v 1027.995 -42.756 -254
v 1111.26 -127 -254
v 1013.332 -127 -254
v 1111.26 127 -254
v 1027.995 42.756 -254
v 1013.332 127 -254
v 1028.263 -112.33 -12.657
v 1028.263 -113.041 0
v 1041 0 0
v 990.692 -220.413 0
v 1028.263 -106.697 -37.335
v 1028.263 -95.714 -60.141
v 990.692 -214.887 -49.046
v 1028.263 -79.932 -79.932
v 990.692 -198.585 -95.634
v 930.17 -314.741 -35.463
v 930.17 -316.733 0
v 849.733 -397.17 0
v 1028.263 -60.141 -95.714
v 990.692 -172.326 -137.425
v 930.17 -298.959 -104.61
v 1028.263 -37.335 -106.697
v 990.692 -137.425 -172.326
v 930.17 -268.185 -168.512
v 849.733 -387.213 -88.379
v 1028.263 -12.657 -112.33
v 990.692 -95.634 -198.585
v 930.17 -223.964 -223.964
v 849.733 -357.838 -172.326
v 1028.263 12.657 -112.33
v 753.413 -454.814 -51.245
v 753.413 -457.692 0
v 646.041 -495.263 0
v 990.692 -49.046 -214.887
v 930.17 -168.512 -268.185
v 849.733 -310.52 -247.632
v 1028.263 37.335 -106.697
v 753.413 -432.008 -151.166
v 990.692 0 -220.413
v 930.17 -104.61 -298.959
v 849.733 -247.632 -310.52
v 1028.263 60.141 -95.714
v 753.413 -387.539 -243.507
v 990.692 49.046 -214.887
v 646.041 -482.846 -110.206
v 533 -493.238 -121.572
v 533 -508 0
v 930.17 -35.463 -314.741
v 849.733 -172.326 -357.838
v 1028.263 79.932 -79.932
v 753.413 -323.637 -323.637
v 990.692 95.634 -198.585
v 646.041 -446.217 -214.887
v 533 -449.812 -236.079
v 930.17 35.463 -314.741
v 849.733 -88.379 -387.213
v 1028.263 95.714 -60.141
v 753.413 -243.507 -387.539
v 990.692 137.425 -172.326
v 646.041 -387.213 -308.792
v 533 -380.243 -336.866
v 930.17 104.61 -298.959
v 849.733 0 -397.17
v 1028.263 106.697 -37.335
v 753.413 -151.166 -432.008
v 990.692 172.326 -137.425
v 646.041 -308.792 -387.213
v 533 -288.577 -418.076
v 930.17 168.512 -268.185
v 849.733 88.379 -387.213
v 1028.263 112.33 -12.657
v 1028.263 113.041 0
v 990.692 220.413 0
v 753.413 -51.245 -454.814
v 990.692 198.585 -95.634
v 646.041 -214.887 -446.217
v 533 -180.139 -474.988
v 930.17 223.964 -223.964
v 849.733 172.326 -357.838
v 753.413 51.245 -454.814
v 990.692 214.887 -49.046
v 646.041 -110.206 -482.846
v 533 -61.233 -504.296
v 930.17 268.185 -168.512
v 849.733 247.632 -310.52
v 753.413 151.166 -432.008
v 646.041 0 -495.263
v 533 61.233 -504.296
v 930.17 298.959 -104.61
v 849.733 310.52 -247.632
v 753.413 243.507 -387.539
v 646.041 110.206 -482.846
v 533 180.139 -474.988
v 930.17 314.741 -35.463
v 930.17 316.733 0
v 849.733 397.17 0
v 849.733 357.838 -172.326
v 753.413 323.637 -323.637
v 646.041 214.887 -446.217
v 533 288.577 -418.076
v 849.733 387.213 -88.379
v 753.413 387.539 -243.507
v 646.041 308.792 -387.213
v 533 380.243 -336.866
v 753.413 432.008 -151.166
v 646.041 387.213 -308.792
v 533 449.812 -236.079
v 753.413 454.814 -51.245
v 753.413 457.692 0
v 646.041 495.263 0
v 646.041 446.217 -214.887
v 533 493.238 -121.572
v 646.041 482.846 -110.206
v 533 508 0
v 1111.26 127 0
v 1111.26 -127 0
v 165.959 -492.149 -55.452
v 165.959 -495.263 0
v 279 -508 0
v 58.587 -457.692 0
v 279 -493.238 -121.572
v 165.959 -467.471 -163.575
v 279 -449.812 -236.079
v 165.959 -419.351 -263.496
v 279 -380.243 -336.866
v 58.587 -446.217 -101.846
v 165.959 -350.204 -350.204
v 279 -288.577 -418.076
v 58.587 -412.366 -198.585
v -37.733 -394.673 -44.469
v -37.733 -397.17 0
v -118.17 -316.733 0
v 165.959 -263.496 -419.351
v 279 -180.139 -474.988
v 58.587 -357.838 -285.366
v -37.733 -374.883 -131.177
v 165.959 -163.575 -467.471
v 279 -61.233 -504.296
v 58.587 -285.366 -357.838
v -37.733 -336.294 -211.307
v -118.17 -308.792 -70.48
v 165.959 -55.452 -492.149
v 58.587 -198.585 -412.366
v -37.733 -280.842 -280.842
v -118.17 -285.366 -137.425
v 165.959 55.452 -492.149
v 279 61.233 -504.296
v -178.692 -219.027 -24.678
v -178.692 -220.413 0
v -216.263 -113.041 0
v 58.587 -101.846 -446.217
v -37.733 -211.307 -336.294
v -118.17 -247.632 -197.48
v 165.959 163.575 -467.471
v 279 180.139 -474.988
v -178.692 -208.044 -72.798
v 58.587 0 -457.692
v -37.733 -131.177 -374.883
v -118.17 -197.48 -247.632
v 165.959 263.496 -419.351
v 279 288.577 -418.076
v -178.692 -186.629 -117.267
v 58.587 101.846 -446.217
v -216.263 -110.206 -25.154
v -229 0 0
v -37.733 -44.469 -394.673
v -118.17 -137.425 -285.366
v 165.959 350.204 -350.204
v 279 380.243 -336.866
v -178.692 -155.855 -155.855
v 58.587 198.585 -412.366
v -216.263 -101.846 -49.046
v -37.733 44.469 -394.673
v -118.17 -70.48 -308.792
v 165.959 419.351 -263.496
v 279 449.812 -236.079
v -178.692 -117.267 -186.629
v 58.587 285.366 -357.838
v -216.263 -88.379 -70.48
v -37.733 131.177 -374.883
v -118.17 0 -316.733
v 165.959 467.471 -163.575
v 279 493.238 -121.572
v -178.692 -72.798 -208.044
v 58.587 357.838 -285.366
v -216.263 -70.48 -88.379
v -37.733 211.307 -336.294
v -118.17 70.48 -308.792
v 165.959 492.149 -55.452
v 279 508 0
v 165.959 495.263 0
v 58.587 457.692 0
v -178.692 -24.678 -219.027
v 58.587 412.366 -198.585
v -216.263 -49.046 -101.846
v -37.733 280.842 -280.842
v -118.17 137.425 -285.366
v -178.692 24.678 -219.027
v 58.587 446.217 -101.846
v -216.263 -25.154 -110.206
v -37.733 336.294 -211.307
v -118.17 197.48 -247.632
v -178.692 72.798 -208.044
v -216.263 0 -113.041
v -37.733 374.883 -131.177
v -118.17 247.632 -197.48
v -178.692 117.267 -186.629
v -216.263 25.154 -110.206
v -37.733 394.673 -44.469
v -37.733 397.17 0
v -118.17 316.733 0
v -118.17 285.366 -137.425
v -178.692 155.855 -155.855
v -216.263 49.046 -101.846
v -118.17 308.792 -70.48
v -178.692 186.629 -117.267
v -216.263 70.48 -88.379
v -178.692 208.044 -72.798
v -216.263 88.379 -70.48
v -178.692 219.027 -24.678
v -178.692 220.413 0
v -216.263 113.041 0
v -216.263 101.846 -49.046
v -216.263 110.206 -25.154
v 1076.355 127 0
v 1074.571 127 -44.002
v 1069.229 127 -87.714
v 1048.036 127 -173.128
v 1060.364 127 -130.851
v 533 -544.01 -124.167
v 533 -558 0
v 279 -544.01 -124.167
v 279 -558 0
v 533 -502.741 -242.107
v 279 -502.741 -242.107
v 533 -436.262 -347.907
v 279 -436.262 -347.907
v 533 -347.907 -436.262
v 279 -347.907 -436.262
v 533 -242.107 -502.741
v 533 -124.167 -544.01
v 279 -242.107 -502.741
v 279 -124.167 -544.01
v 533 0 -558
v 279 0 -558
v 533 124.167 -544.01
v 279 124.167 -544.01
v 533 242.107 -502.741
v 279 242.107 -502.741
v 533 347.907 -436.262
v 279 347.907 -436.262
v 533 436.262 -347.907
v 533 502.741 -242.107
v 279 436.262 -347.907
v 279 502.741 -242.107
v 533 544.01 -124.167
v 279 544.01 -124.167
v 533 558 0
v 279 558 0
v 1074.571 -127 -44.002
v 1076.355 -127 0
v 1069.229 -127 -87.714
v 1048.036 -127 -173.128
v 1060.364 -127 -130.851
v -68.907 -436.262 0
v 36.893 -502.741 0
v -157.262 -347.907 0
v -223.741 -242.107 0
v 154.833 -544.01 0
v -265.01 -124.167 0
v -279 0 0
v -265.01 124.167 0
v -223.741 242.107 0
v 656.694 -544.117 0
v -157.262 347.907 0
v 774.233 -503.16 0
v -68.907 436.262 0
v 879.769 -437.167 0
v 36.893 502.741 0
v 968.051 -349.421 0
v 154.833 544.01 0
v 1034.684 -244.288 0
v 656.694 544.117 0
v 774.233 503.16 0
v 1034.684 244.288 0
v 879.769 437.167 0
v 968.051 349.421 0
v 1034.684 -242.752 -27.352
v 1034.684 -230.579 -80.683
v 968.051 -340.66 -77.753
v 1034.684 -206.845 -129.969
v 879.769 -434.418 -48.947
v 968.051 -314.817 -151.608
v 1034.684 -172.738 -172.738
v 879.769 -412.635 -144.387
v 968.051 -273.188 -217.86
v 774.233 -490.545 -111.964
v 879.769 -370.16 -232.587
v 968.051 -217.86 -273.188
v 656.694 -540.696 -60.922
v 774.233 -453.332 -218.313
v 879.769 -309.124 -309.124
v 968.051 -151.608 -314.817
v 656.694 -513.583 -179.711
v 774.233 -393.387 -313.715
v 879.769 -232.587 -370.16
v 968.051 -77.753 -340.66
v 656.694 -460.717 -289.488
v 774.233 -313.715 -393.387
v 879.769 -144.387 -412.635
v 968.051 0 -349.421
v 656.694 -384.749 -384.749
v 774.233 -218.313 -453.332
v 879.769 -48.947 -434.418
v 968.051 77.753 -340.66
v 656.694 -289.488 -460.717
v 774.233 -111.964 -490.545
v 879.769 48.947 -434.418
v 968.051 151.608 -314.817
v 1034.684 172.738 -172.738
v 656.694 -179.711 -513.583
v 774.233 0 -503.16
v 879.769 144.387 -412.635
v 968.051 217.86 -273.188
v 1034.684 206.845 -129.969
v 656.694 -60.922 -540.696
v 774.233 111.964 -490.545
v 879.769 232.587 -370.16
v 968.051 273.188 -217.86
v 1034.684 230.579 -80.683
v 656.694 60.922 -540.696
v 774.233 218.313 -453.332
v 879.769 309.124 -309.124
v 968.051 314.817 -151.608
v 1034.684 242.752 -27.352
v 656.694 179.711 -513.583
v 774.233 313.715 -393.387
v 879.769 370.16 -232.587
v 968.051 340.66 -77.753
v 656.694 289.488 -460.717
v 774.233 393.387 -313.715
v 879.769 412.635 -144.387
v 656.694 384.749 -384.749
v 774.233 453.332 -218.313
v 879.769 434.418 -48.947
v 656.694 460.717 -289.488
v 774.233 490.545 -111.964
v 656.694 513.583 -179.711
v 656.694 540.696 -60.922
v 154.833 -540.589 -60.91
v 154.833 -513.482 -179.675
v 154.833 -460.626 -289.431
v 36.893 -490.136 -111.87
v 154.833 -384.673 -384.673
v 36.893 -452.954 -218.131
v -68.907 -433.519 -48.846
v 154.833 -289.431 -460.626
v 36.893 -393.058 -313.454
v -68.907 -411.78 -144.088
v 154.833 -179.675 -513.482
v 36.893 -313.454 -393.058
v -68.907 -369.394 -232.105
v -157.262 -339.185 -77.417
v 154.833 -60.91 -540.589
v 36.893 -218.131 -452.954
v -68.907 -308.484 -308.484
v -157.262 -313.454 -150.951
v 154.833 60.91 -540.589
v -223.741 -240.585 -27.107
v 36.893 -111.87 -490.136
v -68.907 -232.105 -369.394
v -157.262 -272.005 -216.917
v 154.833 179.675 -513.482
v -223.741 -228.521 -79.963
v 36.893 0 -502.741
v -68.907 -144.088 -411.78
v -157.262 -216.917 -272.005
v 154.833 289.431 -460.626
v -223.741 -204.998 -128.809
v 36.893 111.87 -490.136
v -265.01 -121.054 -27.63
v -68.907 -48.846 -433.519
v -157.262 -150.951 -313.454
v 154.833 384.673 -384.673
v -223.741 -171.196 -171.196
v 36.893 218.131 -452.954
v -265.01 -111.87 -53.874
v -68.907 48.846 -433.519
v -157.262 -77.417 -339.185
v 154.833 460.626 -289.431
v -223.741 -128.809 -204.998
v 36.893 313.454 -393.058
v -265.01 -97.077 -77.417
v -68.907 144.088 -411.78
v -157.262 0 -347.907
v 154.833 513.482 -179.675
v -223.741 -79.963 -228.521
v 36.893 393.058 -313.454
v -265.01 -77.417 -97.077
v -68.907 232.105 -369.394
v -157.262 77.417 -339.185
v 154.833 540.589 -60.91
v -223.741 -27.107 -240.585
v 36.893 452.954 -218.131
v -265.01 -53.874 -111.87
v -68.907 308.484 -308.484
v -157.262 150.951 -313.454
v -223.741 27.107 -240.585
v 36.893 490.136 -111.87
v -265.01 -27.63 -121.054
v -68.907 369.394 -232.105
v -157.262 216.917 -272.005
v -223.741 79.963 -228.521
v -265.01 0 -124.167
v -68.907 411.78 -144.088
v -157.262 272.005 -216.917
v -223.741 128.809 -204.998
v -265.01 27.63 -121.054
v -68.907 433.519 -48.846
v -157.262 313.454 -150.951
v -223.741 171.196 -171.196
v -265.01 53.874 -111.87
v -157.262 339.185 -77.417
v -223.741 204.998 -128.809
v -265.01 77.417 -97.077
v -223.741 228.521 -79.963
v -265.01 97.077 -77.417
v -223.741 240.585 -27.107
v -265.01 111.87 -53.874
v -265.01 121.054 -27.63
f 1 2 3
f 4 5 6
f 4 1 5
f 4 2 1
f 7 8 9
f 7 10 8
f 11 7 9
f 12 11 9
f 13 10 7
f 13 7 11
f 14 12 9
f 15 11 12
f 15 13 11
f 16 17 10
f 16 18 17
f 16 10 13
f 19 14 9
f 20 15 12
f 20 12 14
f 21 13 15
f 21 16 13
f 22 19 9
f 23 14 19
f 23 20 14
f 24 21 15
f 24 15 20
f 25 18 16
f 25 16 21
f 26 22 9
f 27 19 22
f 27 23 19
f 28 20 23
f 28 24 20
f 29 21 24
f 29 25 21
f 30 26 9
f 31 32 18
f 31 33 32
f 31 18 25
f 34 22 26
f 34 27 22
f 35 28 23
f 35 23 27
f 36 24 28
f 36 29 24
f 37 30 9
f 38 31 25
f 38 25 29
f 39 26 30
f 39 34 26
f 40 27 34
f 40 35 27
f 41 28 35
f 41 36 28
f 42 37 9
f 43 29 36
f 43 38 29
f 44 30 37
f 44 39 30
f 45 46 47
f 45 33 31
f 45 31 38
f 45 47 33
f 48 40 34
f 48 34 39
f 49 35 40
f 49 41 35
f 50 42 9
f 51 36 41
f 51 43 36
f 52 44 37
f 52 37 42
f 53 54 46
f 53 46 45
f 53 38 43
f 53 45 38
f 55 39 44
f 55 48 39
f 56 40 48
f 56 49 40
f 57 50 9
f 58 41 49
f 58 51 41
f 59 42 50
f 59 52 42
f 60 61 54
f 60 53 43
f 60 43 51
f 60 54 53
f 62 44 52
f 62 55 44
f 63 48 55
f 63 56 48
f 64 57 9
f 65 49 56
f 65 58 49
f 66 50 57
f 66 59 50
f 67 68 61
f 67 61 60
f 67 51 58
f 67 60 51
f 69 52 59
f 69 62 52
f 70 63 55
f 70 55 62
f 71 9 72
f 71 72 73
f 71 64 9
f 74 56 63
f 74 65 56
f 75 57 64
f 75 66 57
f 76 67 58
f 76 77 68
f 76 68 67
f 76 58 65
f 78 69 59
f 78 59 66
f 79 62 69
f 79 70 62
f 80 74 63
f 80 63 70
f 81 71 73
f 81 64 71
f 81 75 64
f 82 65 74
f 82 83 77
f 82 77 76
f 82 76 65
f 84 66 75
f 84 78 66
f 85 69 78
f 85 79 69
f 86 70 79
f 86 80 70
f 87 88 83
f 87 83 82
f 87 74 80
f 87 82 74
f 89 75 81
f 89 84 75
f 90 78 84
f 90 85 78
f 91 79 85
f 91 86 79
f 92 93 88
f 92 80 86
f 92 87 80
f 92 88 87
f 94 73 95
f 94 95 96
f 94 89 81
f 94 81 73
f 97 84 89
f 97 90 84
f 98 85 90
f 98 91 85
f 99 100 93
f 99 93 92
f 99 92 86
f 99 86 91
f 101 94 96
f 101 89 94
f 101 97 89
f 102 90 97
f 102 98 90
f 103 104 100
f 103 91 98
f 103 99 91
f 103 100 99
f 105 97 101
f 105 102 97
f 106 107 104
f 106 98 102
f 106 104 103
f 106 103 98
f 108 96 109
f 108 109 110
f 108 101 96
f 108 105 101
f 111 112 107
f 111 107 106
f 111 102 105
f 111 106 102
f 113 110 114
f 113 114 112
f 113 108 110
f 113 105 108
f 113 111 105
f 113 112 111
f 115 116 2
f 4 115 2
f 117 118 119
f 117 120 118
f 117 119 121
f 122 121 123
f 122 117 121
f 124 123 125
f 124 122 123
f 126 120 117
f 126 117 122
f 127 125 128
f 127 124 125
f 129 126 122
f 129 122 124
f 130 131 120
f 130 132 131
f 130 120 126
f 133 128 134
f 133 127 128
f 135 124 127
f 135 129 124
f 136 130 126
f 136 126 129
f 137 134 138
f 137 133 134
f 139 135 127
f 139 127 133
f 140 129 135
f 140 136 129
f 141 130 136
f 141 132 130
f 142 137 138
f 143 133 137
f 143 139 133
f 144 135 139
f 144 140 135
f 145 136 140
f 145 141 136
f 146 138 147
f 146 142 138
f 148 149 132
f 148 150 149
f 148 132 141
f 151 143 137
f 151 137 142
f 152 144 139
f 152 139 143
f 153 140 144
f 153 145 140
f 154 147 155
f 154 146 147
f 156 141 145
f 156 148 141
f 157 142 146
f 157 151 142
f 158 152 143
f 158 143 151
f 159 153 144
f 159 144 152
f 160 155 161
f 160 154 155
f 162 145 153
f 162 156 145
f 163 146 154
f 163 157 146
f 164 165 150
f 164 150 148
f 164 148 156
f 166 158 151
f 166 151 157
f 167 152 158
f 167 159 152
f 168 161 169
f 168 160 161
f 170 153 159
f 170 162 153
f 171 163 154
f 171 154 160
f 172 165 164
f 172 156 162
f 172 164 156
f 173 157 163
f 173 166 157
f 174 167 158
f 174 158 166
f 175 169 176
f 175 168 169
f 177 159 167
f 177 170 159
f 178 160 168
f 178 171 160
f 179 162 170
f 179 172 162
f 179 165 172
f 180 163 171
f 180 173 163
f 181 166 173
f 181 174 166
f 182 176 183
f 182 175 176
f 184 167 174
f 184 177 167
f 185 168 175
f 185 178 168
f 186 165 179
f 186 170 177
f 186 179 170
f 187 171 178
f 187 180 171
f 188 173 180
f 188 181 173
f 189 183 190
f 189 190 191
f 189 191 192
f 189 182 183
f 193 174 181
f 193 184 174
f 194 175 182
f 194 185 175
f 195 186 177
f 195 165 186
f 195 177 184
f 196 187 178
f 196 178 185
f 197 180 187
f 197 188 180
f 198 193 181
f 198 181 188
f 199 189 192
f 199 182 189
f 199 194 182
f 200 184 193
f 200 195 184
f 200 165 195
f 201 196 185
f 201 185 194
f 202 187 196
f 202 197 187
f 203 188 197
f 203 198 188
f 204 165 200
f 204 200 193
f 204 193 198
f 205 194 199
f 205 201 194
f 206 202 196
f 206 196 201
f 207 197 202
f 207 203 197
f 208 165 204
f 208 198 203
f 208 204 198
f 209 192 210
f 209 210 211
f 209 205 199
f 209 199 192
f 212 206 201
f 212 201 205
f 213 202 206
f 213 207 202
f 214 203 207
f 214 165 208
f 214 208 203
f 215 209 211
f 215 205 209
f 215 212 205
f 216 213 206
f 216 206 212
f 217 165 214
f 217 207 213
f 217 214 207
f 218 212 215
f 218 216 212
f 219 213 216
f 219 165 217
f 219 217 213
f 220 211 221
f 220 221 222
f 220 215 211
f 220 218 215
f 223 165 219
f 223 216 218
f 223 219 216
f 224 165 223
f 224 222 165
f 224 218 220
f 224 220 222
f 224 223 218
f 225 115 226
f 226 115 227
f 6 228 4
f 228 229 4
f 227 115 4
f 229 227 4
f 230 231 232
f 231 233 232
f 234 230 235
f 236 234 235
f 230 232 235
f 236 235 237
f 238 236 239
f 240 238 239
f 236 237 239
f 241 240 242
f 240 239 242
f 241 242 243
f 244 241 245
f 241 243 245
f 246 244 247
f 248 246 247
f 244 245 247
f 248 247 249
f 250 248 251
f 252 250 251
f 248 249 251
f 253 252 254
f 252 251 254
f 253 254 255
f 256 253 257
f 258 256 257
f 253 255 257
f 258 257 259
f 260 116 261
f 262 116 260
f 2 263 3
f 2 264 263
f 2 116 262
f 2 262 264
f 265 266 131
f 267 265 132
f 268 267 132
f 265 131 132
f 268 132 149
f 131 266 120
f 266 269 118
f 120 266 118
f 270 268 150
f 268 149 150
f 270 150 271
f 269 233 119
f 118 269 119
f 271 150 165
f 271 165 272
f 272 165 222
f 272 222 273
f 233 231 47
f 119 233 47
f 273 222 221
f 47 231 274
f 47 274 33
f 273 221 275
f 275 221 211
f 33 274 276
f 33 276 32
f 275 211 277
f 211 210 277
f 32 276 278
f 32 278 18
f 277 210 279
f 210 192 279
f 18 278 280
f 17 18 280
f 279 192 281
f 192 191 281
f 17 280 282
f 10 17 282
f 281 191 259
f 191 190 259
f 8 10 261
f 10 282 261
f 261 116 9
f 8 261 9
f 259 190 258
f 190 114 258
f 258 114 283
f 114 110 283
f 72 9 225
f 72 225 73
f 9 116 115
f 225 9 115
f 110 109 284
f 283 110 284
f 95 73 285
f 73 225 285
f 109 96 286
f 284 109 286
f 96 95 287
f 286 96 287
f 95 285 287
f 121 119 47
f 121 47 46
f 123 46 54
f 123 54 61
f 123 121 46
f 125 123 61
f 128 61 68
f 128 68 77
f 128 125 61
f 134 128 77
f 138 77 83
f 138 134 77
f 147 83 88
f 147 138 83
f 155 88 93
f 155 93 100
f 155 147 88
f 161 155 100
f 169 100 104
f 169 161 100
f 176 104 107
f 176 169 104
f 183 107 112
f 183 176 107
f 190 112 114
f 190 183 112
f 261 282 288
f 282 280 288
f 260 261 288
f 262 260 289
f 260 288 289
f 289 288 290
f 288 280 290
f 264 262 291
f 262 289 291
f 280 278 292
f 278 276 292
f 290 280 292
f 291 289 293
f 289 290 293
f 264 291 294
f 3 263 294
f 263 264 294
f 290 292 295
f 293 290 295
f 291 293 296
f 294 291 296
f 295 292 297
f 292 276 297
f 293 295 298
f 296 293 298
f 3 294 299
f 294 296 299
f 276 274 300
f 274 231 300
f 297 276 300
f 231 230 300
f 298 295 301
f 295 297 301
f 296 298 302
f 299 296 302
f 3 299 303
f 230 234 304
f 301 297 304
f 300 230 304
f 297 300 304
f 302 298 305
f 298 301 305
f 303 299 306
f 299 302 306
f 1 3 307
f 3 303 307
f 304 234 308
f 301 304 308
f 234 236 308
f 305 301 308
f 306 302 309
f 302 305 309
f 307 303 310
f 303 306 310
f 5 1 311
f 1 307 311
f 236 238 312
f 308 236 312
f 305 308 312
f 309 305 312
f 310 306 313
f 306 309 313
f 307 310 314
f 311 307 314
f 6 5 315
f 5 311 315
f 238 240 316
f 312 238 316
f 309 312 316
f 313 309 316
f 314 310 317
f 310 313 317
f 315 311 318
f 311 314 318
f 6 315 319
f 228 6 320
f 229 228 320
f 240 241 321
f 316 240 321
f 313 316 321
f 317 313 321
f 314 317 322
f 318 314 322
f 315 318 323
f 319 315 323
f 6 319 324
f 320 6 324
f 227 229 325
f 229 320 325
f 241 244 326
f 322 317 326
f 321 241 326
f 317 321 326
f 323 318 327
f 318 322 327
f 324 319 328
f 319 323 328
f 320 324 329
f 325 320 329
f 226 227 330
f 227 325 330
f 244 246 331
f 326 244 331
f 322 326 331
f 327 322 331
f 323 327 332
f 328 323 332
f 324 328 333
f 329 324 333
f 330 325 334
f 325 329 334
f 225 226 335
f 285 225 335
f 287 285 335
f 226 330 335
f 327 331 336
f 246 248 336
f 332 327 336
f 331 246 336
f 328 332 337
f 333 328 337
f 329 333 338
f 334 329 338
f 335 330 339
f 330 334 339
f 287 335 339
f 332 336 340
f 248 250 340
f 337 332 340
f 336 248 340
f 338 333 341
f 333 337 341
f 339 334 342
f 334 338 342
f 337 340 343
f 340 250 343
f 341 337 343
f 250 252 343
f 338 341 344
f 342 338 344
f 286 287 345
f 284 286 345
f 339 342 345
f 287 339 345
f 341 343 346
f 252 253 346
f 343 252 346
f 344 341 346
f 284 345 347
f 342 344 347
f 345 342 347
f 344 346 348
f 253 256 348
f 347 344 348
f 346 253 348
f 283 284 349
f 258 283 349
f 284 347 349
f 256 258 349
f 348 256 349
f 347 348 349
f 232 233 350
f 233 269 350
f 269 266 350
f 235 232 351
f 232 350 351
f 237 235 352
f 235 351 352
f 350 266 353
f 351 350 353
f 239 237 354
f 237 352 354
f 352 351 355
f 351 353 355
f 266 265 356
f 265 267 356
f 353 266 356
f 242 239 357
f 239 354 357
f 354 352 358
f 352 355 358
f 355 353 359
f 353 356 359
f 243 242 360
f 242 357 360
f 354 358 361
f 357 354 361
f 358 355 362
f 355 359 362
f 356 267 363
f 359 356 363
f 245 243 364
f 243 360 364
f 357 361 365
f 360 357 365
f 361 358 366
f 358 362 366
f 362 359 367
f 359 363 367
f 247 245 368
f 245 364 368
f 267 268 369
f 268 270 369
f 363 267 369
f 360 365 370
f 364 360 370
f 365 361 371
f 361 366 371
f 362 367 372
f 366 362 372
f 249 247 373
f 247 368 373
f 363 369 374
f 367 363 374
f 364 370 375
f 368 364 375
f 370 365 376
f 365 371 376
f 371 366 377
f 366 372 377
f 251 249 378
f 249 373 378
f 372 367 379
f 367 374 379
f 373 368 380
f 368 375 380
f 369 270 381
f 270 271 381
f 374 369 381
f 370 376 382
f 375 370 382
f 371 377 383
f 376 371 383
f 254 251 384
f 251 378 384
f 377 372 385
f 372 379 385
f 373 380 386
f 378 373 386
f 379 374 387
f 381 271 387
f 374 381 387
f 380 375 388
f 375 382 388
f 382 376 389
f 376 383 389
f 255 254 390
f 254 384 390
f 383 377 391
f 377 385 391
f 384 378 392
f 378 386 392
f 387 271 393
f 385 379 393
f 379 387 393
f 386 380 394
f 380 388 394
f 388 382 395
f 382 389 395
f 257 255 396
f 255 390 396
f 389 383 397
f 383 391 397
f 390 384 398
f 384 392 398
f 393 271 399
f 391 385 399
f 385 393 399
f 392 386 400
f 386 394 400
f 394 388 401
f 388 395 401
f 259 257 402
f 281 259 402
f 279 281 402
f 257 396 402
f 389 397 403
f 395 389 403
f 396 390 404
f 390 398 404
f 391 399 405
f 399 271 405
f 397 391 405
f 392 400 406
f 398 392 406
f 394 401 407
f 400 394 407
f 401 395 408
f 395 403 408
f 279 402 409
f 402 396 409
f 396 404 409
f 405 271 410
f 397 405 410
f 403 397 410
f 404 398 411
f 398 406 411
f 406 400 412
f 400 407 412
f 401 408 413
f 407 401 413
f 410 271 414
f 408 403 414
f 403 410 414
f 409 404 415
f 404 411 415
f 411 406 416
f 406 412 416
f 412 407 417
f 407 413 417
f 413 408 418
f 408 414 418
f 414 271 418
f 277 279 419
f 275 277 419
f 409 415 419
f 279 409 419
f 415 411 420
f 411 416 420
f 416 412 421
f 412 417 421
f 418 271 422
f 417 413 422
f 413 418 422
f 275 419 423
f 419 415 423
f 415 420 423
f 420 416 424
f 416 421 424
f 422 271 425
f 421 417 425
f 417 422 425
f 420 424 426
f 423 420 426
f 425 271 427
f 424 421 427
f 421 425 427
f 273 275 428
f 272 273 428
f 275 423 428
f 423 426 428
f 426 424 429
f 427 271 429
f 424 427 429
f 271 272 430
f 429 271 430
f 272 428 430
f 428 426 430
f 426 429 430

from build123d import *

# Parameters (mm, degrees)
REVOLVE1_ANGLE           = 180
SHELL1_T                 = -50
BOSS_EXTRUDE2_REACH      = 1600.609
BOSS_EXTRUDE2_END_RADIUS = 558
SKETCH5_W                = 254
SKETCH5_H                = 254


with BuildPart() as part:
    # Sketch2 → Revolve1 (revolve)
    with BuildSketch(Plane.XY):
        with BuildLine():
            Line((-279, 0), (279, 0))
            Line((279, 0), (533, 0))
            Line((533, 0), (1091, 0))
            ThreePointArc((1091, 0), (927.565583902, -394.565583902), (533, -558))
            Line((533, -558), (279, -558))
            ThreePointArc((279, -558), (-115.565583902, -394.565583902), (-279, 0))
        make_face()
    revolve(axis=Axis((533, 0, 0), (1, 0, 0)), revolution_arc=REVOLVE1_ANGLE)

    # Shell1
    shell1_openings = [part.faces().sort_by_distance(p)[0] for p in [
        (406, 0, 0),
    ]]
    offset(amount=SHELL1_T, openings=shell1_openings)

    # Boss-Extrude2: up to this sphere (the profile starts outside it)
    boss_extrude2_end = Location((533, 0, 0)) * Sphere(BOSS_EXTRUDE2_END_RADIUS, mode=Mode.PRIVATE)
    # Sketch5 → Boss-Extrude2 (add, up to the surface)
    with BuildSketch(Plane(origin=(1111.26, 0, 0), x_dir=(0, 0, -1), z_dir=(1, 0, 0)), mode=Mode.PRIVATE) as boss_extrude2_sk1:
        with Locations((127, 0)):
            Rectangle(SKETCH5_W, SKETCH5_H)
    boss_extrude2_tool1 = extrude(boss_extrude2_sk1.sketch, amount=-BOSS_EXTRUDE2_REACH, mode=Mode.PRIVATE) - boss_extrude2_end
    add(boss_extrude2_tool1.solids().sort_by_distance((1111.26, 0, -127))[0])


solid = part.part
